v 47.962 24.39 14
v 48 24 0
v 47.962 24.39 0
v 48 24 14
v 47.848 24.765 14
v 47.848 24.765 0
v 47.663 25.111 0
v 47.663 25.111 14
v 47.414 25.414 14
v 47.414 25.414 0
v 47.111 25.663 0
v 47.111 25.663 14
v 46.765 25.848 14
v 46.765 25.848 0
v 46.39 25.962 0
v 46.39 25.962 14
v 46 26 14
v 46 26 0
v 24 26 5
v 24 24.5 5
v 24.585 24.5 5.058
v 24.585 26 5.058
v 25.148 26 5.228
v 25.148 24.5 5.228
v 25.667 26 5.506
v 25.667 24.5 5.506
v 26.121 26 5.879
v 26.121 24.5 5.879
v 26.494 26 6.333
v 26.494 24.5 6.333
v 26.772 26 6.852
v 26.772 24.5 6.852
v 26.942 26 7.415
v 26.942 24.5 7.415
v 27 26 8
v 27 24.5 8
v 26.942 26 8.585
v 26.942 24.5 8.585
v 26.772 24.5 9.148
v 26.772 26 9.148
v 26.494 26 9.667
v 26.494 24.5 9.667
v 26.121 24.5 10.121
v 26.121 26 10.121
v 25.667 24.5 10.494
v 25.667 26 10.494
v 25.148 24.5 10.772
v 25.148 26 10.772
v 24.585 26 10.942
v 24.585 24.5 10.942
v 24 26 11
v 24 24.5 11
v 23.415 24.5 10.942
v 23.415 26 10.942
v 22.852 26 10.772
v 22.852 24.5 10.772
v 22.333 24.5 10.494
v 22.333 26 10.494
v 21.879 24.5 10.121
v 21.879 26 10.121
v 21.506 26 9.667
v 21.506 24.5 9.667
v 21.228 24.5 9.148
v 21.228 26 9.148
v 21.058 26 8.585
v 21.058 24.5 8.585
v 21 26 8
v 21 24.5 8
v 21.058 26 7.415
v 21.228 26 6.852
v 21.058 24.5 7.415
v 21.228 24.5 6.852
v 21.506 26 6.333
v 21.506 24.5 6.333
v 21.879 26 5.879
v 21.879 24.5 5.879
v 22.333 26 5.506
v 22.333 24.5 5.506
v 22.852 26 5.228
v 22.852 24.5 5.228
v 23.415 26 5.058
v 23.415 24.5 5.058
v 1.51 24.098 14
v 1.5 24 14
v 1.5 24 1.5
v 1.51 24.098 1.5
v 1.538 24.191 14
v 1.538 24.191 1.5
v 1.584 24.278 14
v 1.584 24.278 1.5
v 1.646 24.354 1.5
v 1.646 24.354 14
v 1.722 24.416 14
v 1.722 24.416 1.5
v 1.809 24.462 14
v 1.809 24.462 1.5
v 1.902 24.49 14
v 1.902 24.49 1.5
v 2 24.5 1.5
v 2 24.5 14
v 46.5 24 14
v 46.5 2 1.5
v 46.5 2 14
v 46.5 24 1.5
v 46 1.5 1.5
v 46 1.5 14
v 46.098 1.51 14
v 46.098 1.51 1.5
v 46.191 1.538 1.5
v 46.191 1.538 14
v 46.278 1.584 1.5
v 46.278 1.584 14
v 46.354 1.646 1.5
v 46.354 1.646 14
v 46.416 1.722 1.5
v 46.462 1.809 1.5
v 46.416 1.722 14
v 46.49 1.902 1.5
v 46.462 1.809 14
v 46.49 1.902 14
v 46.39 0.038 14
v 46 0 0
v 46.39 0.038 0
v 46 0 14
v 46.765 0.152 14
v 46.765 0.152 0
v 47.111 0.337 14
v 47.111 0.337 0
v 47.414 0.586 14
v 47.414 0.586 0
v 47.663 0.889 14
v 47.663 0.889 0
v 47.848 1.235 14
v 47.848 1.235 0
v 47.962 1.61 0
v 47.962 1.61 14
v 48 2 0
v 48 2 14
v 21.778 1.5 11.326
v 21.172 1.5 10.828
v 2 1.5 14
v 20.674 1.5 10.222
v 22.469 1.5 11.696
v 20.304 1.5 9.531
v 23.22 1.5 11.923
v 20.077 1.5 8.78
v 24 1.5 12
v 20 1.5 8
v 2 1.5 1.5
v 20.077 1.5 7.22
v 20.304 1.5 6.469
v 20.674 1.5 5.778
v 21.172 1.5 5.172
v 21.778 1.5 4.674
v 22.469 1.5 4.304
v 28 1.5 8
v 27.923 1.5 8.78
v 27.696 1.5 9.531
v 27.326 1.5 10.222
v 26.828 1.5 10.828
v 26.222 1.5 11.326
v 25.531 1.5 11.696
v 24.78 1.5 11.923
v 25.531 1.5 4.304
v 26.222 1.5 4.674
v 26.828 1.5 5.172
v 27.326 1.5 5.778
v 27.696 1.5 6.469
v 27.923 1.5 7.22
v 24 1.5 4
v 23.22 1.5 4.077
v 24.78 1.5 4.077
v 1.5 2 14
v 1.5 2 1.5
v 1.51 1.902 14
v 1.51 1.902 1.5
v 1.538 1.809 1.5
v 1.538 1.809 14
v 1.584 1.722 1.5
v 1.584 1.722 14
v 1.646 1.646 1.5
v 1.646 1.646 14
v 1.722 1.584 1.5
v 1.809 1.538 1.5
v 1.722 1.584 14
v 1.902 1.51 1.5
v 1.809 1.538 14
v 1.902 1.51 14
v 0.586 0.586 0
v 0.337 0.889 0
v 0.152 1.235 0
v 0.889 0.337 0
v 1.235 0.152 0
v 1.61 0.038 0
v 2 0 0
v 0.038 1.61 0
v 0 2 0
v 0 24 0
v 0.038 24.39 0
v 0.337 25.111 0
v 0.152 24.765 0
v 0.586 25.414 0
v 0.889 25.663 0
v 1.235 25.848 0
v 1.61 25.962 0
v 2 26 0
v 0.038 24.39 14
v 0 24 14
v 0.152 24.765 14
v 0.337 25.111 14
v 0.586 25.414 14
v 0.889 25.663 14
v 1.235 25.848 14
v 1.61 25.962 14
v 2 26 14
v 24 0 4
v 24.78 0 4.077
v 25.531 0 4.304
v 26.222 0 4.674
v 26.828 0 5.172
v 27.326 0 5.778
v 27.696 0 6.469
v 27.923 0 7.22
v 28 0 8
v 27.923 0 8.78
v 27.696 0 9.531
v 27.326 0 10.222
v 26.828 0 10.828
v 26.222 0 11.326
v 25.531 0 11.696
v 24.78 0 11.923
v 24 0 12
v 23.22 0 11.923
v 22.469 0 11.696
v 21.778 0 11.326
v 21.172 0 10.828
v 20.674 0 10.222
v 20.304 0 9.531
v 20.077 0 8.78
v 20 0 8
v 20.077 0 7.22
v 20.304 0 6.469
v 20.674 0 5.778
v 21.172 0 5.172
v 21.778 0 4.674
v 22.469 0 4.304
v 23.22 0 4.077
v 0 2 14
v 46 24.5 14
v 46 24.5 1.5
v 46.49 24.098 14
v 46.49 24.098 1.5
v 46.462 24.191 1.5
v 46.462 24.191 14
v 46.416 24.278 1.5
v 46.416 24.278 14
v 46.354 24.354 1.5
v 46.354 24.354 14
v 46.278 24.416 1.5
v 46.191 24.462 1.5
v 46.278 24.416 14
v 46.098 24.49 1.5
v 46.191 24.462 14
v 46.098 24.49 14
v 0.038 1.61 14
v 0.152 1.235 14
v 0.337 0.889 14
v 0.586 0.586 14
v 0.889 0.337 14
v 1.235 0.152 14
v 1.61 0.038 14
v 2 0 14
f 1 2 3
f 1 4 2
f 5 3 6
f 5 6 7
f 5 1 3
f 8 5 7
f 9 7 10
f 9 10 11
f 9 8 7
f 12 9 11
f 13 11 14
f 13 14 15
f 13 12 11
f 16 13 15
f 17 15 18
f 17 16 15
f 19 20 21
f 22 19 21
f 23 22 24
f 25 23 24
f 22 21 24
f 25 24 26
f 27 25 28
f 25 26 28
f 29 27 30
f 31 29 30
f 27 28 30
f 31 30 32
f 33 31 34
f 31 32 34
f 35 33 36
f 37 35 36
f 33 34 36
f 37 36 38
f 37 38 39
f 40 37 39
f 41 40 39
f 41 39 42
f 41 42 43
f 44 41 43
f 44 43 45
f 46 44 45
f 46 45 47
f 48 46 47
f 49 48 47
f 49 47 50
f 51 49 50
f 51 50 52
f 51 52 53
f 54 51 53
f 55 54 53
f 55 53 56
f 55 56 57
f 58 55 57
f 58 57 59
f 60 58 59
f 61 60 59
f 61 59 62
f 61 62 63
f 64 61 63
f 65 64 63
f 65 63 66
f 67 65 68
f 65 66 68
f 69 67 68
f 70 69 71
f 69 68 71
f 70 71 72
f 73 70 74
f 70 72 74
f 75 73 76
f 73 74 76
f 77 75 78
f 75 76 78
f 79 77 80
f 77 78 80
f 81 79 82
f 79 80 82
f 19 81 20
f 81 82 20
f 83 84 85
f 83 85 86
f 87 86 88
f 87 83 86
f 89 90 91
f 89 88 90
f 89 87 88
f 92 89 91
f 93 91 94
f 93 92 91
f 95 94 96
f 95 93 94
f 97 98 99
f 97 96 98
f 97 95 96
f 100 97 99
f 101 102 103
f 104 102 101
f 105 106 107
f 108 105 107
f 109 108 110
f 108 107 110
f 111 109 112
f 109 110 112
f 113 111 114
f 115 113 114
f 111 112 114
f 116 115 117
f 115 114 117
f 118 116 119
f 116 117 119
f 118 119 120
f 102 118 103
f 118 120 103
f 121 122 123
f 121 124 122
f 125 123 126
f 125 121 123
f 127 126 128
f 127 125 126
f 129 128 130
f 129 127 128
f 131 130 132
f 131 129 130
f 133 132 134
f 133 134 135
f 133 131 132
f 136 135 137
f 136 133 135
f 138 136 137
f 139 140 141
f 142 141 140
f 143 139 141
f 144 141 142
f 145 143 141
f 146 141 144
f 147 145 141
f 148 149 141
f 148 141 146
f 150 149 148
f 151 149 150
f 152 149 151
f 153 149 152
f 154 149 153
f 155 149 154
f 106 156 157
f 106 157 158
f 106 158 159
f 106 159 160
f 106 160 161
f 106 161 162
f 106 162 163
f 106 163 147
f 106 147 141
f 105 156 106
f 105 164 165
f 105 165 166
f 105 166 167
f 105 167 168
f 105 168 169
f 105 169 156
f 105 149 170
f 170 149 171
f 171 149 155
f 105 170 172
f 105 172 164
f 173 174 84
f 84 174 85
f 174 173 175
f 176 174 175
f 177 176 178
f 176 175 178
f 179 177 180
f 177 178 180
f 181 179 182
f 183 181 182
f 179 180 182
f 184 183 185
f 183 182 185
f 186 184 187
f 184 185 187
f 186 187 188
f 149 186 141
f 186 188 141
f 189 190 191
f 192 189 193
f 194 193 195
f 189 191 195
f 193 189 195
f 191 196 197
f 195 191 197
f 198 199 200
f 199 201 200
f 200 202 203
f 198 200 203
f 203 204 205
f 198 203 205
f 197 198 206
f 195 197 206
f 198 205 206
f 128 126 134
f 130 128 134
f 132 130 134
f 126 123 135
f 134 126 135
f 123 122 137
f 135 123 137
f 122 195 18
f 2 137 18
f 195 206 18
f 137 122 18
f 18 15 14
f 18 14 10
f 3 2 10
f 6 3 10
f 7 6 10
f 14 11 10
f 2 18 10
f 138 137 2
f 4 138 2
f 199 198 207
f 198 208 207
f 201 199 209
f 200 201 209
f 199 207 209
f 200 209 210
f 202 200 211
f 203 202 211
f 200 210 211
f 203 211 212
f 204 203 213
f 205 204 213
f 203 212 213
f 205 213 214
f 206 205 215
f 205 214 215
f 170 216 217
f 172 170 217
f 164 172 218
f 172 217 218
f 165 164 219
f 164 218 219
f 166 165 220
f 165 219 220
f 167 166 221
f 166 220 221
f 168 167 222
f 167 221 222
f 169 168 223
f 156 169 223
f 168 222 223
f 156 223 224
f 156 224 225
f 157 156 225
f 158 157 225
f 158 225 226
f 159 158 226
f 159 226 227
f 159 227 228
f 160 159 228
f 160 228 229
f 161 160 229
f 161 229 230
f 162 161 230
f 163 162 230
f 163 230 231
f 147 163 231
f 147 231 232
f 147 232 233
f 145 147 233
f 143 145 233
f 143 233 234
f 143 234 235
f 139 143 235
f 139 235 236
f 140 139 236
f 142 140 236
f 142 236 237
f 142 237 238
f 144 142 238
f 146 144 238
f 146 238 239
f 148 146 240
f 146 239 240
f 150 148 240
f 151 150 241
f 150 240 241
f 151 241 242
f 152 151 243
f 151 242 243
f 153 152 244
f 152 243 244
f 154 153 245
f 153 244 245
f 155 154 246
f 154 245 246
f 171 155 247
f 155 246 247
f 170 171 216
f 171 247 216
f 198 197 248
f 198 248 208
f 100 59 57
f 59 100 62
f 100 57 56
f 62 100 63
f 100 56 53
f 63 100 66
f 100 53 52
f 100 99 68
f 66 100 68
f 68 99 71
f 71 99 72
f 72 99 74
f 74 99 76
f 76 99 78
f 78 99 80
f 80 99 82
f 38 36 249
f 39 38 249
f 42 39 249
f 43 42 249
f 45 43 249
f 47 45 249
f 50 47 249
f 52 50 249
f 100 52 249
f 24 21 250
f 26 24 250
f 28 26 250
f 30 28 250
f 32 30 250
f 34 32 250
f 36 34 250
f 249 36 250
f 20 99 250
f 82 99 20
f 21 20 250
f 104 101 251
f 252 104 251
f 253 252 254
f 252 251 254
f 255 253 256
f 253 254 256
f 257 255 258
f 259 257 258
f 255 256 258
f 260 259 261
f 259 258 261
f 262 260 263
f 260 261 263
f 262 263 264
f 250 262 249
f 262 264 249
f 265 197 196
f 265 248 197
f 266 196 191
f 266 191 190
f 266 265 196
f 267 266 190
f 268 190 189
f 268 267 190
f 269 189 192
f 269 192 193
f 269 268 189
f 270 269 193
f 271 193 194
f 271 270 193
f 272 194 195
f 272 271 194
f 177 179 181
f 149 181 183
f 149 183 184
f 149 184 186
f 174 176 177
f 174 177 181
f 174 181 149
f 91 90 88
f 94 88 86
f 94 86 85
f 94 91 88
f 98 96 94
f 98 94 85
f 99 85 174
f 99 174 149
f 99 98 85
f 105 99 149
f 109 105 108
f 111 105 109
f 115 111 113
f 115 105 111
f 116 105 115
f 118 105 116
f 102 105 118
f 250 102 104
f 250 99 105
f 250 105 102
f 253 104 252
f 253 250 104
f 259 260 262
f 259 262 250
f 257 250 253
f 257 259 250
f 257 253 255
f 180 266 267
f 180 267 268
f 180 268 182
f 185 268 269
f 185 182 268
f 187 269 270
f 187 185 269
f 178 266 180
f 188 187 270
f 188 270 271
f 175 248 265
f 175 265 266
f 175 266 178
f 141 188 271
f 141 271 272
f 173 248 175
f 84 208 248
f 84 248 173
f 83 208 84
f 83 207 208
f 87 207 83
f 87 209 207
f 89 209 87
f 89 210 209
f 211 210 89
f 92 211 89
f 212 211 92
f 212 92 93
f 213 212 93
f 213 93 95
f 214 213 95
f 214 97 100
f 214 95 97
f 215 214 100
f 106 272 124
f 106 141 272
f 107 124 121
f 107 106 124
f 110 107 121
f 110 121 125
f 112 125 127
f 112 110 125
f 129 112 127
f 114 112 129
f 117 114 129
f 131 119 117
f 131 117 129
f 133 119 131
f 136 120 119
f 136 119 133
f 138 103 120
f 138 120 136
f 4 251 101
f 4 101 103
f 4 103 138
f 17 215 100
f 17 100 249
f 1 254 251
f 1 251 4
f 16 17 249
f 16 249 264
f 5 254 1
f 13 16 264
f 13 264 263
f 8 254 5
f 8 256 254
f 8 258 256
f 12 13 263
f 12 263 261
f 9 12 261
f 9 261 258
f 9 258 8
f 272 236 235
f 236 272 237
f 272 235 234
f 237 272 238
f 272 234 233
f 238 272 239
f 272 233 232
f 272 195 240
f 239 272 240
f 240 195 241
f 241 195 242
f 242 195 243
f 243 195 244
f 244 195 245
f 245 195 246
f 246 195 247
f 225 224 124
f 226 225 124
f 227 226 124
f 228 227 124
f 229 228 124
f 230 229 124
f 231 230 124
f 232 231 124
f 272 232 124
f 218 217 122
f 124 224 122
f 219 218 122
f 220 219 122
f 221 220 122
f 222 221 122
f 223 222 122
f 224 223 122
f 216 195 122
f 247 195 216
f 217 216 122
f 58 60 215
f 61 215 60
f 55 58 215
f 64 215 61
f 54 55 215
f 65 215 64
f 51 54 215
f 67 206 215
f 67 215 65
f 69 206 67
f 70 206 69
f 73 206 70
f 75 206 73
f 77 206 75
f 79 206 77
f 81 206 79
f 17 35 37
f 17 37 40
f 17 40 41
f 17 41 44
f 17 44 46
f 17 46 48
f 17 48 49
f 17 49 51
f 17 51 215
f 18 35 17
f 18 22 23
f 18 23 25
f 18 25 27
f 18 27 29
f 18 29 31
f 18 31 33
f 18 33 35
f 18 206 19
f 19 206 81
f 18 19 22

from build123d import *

# Parameters (mm, degrees)
SKETCH_1_W               = 48
SKETCH_1_H               = 26
ENCLOSURE_DEPTH          = 14
FILLET_2_R               = 2
SHELL_1_T                = -1.5
SKETCH_2_R               = 3
CABLE_ENTRY_DEPTH        = 57.356011214
SKETCH_3_R               = 4
CABLE_ENTRY_RELIEF_DEPTH = 1.6


with BuildPart() as part:
    # 草图1 → Enclosure (new body)
    with BuildSketch(Plane.XY):
        with Locations((24, 13)):
            Rectangle(SKETCH_1_W, SKETCH_1_H)
    extrude(amount=ENCLOSURE_DEPTH)

    # Fillet 2
    fillet_2_edges = [part.edges().sort_by_distance(p)[0] for p in [
        (0, 26, 7),
        (48, 26, 7),
        (48, 0, 7),
        (0, 0, 7),
    ]]
    fillet(fillet_2_edges, radius=FILLET_2_R)

    # 抽壳1
    shell_1_openings = [part.faces().sort_by_distance(p)[0] for p in [
        (24, 13, 14),
    ]]
    offset(amount=SHELL_1_T, openings=shell_1_openings, kind=Kind.INTERSECTION)

    # 草图2 → Cable_entry (cut, through all)
    with BuildSketch(Plane.XZ):
        with Locations(Location((24, 8, 0), (0, 0, 270))):
            Circle(SKETCH_2_R)
    extrude(amount=-CABLE_ENTRY_DEPTH, mode=Mode.SUBTRACT)

    # 草图3 → Cable_entry_relief (cut)
    with BuildSketch(Plane.XZ):
        with Locations(Location((24, 8, 0), (0, 0, 270))):
            Circle(SKETCH_3_R)
    extrude(amount=-CABLE_ENTRY_RELIEF_DEPTH, mode=Mode.SUBTRACT)


solid = part.part
